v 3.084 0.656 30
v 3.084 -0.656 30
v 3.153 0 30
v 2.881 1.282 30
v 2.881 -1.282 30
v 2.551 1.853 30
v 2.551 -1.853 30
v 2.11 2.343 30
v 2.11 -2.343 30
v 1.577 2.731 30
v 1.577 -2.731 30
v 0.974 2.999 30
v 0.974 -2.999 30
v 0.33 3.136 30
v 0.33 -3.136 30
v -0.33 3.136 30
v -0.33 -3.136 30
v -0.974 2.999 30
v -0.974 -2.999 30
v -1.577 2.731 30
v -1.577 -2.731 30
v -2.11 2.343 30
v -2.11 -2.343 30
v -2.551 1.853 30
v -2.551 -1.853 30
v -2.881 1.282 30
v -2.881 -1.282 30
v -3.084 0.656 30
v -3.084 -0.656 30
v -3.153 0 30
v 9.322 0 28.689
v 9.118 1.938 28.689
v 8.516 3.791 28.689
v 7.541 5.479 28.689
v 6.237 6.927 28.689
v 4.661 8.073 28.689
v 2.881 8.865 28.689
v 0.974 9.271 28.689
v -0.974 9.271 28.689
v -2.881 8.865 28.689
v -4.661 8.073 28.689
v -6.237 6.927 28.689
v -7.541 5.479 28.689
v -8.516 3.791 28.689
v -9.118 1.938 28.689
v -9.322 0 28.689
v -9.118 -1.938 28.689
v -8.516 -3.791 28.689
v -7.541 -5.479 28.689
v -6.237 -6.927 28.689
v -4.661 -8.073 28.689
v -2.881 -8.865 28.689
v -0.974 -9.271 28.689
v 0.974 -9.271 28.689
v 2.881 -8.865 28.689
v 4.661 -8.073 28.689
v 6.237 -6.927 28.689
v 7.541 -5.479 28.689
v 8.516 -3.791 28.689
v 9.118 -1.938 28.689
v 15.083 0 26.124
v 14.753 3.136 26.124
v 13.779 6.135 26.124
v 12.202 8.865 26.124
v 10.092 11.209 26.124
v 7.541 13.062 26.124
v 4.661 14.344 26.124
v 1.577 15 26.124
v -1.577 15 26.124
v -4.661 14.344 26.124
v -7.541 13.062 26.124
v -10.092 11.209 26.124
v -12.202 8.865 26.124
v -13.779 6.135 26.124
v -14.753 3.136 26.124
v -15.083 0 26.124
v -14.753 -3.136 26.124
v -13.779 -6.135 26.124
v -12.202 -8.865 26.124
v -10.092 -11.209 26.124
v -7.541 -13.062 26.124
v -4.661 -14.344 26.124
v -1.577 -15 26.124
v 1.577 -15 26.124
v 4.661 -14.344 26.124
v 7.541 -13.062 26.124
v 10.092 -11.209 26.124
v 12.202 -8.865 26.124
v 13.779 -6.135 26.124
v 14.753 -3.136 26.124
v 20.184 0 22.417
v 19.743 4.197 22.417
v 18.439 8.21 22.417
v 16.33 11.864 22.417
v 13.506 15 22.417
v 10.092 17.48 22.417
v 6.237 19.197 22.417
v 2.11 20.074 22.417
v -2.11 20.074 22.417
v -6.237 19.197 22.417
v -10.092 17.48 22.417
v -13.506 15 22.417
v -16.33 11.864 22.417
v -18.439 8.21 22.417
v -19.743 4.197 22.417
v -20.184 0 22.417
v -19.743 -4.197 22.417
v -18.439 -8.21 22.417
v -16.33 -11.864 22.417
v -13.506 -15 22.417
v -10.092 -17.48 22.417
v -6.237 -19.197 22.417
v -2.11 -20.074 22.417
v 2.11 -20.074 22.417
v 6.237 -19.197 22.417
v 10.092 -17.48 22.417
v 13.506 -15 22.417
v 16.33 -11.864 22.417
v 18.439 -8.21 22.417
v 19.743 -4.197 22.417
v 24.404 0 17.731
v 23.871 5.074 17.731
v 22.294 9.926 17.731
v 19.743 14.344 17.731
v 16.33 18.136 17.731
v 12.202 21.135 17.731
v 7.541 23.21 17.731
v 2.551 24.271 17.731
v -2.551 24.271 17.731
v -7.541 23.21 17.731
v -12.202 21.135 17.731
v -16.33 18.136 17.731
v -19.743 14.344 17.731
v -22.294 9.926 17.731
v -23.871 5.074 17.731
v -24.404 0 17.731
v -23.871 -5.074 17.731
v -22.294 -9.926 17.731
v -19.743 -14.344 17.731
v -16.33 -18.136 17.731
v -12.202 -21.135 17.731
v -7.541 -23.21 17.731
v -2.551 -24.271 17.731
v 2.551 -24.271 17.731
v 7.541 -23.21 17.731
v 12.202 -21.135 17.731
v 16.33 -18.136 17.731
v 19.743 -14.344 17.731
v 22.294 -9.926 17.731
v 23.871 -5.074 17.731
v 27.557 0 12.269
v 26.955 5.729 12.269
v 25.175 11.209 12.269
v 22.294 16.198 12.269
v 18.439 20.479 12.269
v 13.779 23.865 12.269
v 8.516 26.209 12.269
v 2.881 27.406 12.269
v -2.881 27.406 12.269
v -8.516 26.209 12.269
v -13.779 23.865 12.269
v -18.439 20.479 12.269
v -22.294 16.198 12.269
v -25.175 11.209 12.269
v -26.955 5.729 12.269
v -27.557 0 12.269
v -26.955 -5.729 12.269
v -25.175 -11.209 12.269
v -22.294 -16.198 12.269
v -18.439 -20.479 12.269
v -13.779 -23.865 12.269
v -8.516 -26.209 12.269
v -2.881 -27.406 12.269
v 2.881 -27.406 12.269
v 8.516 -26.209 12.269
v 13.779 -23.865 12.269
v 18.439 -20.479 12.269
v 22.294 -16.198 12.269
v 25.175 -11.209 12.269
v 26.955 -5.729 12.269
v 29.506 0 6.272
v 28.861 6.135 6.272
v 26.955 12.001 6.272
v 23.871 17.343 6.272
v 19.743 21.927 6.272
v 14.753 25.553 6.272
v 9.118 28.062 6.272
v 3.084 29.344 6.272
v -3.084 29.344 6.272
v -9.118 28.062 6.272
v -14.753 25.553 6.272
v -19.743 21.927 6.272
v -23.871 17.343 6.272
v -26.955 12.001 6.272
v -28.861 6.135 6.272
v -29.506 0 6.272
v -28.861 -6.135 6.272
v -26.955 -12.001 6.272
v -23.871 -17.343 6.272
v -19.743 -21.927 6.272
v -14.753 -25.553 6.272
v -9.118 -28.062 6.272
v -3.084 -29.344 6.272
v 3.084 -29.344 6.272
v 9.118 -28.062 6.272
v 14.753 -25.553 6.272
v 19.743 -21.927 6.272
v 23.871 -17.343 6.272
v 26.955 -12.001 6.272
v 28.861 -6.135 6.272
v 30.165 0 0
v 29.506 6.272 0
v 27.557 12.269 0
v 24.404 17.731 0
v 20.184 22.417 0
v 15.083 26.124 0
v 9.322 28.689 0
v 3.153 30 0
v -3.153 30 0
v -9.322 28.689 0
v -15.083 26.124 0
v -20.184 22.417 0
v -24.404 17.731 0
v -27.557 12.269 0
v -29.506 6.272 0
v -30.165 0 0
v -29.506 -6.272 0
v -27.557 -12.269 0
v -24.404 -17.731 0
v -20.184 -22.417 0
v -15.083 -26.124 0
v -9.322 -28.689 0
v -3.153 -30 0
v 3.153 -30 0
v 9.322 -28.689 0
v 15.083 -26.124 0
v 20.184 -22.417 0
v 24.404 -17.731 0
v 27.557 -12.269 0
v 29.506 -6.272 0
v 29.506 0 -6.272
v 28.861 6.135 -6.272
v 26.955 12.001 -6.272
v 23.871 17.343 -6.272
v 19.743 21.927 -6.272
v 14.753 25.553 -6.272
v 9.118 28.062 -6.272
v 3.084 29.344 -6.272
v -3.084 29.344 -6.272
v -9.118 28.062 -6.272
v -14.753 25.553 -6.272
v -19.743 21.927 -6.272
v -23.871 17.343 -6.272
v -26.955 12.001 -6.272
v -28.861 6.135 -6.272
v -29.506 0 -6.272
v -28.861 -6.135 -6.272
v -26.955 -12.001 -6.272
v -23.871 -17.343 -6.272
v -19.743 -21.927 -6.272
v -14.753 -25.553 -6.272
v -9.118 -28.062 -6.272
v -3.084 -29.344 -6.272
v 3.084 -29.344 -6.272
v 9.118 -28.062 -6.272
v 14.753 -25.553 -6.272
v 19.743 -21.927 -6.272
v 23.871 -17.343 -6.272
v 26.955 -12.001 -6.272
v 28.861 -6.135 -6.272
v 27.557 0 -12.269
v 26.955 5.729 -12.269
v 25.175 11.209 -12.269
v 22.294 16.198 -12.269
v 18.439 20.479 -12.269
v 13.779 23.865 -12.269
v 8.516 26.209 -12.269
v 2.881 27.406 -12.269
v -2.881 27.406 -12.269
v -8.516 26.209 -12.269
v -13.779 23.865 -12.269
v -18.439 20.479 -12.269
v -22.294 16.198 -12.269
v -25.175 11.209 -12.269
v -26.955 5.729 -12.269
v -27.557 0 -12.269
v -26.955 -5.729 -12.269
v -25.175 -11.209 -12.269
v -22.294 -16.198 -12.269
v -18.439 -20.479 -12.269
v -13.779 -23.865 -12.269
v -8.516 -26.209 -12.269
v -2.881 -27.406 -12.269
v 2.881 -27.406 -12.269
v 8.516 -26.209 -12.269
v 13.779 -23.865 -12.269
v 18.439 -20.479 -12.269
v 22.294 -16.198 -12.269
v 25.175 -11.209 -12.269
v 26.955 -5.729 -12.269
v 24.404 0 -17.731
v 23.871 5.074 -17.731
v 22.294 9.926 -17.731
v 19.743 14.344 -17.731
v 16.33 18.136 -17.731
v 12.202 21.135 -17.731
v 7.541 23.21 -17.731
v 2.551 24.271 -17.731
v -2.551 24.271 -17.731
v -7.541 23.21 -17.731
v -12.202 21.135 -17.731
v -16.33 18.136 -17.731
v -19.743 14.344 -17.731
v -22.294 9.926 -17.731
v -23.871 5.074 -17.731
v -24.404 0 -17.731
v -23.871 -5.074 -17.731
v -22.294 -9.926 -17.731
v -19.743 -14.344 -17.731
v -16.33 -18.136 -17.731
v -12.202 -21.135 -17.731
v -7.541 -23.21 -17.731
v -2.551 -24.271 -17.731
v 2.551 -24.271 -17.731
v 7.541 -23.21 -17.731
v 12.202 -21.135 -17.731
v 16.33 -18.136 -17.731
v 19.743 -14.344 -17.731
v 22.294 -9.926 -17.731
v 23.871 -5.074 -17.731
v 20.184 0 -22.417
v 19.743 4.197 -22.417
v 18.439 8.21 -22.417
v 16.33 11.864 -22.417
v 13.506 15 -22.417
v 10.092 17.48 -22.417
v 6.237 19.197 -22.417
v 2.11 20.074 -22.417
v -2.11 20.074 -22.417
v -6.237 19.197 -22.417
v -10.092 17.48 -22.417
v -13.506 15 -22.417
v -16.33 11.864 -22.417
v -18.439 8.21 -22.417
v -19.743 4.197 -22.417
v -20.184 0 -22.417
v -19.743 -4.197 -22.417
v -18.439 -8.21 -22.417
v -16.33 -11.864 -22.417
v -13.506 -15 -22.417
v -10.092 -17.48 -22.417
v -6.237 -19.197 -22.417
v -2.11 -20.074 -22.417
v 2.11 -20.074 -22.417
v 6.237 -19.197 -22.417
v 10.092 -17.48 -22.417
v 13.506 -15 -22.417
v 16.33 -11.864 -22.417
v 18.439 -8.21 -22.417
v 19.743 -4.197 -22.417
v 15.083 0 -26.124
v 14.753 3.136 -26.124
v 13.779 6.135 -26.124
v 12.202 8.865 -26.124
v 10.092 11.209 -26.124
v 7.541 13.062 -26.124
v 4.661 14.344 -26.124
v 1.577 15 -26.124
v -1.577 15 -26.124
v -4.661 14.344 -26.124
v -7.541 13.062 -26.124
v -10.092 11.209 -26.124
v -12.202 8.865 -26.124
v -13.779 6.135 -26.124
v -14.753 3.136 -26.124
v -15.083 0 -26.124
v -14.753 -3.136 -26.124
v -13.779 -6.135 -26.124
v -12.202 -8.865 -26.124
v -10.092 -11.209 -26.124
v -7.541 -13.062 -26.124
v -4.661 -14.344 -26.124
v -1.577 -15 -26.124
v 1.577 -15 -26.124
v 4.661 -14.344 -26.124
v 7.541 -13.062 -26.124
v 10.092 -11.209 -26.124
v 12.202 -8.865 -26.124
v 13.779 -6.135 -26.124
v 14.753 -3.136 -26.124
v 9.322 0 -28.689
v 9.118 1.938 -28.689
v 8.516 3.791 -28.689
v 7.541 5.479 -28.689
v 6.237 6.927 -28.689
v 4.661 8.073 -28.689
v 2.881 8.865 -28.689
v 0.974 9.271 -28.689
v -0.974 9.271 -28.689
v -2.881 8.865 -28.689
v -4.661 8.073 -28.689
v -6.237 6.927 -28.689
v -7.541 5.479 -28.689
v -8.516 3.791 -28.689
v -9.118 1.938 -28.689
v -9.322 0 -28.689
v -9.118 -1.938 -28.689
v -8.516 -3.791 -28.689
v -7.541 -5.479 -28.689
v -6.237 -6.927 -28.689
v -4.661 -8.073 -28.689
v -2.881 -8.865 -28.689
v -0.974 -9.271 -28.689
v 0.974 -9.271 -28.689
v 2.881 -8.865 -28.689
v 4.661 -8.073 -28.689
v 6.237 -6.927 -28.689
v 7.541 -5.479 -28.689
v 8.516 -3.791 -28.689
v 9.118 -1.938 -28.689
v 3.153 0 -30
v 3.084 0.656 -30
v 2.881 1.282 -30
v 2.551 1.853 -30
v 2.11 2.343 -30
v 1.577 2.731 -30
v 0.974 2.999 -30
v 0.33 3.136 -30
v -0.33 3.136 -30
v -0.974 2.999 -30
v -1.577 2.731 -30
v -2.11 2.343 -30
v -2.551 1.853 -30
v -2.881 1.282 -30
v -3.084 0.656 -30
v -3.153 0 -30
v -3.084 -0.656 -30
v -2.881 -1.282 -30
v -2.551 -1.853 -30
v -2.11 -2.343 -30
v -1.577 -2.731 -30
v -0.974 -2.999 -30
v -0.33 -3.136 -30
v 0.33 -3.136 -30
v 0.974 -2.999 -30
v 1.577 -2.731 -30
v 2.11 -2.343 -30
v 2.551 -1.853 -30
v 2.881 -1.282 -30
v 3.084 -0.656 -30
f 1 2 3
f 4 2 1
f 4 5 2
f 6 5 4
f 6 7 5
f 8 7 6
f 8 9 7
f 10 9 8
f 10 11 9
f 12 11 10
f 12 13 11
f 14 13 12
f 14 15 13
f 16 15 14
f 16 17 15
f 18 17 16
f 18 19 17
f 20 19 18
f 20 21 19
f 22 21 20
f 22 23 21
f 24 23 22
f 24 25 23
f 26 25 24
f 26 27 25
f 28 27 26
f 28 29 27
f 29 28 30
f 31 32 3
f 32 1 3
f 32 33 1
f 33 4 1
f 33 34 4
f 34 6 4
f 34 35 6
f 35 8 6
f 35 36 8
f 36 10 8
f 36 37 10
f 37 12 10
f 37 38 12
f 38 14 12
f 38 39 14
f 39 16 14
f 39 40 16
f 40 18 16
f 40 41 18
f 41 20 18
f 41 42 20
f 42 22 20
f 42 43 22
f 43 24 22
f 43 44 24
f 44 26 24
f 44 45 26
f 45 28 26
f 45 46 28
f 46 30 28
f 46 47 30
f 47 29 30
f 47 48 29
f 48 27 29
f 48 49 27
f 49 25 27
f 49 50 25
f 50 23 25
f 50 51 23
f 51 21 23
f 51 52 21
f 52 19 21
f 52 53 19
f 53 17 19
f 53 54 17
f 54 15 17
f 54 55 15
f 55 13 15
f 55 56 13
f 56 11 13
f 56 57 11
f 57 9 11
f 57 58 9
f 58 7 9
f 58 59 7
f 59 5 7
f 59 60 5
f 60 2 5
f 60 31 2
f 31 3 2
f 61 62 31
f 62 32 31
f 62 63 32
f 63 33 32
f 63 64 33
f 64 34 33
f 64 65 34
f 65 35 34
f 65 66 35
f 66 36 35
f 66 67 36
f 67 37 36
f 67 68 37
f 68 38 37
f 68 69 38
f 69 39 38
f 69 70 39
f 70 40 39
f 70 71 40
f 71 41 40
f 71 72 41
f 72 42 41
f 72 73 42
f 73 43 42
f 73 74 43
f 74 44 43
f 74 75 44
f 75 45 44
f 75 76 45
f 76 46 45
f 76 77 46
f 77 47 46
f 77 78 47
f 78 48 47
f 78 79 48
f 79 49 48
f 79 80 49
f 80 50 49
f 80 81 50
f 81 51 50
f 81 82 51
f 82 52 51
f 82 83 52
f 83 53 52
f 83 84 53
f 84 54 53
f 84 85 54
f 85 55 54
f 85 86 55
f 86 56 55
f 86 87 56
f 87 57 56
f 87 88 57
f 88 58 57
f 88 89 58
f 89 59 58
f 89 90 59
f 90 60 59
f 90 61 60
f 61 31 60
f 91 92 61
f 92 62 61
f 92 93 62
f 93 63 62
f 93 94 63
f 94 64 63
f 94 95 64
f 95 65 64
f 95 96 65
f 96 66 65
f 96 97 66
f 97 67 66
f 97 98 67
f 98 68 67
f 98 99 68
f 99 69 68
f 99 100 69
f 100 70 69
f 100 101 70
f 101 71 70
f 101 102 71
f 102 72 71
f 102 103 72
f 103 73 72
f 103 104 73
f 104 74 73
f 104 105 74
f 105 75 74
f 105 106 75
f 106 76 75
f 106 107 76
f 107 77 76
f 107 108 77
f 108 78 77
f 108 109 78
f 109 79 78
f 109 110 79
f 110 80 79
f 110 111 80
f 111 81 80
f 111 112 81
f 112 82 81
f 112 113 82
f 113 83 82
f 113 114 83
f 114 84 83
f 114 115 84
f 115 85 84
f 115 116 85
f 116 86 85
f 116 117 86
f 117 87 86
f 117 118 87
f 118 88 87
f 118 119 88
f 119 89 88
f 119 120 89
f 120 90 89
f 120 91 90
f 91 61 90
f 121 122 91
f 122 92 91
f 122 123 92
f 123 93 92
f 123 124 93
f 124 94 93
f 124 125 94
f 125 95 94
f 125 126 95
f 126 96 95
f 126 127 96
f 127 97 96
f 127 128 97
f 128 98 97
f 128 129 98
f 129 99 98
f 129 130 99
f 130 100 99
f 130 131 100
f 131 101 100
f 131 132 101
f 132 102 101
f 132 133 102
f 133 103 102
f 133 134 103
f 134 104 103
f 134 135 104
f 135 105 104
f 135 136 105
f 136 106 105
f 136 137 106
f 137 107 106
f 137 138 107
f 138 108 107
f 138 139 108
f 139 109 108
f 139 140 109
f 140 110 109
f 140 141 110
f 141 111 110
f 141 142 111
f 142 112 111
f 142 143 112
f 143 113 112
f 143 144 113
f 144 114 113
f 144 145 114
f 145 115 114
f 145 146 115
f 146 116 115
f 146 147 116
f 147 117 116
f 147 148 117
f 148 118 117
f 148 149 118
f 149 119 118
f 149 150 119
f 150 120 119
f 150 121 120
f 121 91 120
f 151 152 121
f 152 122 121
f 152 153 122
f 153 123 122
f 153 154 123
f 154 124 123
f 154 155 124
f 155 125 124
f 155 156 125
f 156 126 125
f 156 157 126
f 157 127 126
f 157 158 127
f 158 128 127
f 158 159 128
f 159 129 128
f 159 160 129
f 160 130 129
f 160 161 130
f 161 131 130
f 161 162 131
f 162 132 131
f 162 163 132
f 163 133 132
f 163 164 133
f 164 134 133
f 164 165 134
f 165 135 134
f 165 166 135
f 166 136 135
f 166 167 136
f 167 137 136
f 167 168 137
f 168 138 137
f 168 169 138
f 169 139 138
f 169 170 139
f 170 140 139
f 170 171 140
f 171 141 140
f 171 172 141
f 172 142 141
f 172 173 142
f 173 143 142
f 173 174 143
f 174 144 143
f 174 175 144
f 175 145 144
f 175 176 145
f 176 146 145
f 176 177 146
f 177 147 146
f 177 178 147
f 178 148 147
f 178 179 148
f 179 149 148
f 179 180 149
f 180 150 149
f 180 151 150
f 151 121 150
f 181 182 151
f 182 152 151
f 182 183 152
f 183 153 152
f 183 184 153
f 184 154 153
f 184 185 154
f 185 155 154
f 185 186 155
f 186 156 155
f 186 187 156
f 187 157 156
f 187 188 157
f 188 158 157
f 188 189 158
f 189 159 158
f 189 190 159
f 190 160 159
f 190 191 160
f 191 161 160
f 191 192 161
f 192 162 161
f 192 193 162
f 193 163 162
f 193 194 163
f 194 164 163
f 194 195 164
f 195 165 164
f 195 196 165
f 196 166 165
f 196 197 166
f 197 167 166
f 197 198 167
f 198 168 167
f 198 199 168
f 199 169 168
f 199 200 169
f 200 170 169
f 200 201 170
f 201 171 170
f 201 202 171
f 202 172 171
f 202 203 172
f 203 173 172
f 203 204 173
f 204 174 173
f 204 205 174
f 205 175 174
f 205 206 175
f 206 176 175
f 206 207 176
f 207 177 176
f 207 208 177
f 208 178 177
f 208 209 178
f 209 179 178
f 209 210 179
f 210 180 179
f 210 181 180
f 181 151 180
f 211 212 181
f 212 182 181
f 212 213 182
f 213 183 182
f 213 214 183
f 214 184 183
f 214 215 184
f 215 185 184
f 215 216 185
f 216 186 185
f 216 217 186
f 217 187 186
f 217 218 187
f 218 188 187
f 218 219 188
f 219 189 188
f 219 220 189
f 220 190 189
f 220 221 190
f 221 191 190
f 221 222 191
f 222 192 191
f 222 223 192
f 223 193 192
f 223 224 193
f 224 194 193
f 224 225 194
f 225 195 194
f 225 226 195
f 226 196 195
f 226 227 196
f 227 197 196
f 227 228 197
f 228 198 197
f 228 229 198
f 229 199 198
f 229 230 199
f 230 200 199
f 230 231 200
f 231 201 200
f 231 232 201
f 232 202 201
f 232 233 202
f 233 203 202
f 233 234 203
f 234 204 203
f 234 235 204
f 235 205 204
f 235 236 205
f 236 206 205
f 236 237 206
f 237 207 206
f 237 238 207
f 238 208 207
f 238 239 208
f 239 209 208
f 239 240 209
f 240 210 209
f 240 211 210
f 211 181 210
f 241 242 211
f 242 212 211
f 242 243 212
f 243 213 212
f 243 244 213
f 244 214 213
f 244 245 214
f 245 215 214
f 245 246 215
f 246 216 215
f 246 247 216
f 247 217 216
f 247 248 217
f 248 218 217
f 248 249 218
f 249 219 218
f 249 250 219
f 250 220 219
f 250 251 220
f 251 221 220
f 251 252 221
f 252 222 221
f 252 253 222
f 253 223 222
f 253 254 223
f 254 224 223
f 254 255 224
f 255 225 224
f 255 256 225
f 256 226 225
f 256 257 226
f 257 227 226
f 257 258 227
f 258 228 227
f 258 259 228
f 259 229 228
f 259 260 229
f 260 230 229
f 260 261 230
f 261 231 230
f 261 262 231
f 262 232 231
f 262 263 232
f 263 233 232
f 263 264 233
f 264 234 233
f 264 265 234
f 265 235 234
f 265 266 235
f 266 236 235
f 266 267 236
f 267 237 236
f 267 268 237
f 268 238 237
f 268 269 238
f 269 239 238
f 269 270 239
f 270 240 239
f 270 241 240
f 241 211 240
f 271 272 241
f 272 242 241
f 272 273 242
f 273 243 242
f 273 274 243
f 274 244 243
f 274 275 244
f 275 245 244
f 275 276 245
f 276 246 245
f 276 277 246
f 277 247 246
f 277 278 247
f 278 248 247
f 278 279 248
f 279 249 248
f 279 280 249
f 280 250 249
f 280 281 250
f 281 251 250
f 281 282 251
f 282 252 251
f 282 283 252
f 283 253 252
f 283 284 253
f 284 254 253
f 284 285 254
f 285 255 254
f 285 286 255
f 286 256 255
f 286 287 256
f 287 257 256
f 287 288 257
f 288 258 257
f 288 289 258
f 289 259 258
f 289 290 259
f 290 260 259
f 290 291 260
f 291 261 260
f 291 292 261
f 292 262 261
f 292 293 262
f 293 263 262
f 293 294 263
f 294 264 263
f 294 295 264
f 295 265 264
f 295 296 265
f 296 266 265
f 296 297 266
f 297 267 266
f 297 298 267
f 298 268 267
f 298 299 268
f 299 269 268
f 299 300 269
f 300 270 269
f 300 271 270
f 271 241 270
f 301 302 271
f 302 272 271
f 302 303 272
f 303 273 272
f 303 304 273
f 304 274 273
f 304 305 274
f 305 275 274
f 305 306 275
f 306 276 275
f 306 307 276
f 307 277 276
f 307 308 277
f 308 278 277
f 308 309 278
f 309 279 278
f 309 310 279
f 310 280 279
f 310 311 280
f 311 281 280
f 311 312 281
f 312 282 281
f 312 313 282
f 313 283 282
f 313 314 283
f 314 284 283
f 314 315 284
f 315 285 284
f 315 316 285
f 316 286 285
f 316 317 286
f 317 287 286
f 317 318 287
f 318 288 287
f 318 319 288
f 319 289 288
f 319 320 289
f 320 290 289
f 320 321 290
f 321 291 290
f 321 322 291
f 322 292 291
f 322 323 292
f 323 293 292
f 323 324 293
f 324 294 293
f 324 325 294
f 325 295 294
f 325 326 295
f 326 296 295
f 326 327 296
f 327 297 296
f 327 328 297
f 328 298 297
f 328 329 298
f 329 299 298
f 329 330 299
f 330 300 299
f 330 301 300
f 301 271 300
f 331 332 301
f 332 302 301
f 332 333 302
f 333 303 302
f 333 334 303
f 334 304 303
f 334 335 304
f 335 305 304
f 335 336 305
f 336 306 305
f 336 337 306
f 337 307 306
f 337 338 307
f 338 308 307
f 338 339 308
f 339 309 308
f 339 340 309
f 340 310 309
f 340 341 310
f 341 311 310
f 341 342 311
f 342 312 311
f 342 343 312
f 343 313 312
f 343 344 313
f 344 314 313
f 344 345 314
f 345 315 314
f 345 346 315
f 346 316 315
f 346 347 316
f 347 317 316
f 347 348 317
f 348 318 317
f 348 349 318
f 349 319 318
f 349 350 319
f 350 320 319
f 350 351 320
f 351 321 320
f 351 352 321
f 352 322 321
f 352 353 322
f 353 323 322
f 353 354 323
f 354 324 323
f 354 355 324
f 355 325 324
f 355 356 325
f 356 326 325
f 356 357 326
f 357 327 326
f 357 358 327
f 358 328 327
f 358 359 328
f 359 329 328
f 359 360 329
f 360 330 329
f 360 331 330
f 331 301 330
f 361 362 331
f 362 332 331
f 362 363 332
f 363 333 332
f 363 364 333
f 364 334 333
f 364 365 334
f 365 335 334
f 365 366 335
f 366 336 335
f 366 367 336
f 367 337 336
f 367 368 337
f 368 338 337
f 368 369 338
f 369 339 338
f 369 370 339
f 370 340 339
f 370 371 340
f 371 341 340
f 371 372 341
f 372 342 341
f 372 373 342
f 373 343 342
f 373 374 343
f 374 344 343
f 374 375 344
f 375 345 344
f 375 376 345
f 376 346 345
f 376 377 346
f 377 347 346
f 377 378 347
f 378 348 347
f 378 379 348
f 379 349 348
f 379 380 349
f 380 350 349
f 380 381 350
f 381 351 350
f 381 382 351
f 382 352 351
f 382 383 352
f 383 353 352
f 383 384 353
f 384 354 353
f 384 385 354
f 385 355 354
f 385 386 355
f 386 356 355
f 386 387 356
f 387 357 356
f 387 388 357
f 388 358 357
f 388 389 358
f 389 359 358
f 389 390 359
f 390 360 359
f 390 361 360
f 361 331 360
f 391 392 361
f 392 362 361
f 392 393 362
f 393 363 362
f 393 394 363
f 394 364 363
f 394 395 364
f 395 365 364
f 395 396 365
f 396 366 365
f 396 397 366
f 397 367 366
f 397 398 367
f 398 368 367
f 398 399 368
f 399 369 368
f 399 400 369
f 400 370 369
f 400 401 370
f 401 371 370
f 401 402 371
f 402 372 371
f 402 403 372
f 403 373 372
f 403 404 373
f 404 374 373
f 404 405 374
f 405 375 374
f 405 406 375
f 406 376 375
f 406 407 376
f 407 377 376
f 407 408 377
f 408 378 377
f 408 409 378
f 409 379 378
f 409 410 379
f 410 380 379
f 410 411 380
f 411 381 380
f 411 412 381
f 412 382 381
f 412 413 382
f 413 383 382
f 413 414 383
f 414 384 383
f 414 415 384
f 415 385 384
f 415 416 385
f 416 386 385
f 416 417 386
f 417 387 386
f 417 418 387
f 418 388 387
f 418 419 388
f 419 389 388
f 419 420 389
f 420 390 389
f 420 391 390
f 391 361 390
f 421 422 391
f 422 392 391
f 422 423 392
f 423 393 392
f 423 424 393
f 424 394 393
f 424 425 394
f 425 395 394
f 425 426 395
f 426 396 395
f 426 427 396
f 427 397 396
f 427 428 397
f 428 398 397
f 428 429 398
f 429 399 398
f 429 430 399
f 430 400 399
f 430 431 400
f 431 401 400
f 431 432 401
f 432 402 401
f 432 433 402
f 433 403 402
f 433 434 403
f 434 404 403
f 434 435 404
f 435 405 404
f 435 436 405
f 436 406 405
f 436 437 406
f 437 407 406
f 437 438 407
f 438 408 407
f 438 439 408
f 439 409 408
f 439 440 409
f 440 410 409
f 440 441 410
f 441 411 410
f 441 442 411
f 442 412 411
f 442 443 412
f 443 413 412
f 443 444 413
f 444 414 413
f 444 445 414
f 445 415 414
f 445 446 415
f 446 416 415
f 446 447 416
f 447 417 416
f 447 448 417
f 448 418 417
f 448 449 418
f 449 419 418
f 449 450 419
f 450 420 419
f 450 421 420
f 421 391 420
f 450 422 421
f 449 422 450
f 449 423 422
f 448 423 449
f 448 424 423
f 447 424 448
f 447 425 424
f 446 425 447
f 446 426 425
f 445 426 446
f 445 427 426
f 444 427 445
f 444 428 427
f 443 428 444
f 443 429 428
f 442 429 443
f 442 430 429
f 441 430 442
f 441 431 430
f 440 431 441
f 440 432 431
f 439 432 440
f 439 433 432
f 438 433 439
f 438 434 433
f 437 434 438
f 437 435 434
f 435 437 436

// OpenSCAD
// Unit of length: Unit.MM
resize(newsize = [0.0, 60.0, 0.0], auto = [true, false, true])
{
   sphere(d = 20.0);
}
